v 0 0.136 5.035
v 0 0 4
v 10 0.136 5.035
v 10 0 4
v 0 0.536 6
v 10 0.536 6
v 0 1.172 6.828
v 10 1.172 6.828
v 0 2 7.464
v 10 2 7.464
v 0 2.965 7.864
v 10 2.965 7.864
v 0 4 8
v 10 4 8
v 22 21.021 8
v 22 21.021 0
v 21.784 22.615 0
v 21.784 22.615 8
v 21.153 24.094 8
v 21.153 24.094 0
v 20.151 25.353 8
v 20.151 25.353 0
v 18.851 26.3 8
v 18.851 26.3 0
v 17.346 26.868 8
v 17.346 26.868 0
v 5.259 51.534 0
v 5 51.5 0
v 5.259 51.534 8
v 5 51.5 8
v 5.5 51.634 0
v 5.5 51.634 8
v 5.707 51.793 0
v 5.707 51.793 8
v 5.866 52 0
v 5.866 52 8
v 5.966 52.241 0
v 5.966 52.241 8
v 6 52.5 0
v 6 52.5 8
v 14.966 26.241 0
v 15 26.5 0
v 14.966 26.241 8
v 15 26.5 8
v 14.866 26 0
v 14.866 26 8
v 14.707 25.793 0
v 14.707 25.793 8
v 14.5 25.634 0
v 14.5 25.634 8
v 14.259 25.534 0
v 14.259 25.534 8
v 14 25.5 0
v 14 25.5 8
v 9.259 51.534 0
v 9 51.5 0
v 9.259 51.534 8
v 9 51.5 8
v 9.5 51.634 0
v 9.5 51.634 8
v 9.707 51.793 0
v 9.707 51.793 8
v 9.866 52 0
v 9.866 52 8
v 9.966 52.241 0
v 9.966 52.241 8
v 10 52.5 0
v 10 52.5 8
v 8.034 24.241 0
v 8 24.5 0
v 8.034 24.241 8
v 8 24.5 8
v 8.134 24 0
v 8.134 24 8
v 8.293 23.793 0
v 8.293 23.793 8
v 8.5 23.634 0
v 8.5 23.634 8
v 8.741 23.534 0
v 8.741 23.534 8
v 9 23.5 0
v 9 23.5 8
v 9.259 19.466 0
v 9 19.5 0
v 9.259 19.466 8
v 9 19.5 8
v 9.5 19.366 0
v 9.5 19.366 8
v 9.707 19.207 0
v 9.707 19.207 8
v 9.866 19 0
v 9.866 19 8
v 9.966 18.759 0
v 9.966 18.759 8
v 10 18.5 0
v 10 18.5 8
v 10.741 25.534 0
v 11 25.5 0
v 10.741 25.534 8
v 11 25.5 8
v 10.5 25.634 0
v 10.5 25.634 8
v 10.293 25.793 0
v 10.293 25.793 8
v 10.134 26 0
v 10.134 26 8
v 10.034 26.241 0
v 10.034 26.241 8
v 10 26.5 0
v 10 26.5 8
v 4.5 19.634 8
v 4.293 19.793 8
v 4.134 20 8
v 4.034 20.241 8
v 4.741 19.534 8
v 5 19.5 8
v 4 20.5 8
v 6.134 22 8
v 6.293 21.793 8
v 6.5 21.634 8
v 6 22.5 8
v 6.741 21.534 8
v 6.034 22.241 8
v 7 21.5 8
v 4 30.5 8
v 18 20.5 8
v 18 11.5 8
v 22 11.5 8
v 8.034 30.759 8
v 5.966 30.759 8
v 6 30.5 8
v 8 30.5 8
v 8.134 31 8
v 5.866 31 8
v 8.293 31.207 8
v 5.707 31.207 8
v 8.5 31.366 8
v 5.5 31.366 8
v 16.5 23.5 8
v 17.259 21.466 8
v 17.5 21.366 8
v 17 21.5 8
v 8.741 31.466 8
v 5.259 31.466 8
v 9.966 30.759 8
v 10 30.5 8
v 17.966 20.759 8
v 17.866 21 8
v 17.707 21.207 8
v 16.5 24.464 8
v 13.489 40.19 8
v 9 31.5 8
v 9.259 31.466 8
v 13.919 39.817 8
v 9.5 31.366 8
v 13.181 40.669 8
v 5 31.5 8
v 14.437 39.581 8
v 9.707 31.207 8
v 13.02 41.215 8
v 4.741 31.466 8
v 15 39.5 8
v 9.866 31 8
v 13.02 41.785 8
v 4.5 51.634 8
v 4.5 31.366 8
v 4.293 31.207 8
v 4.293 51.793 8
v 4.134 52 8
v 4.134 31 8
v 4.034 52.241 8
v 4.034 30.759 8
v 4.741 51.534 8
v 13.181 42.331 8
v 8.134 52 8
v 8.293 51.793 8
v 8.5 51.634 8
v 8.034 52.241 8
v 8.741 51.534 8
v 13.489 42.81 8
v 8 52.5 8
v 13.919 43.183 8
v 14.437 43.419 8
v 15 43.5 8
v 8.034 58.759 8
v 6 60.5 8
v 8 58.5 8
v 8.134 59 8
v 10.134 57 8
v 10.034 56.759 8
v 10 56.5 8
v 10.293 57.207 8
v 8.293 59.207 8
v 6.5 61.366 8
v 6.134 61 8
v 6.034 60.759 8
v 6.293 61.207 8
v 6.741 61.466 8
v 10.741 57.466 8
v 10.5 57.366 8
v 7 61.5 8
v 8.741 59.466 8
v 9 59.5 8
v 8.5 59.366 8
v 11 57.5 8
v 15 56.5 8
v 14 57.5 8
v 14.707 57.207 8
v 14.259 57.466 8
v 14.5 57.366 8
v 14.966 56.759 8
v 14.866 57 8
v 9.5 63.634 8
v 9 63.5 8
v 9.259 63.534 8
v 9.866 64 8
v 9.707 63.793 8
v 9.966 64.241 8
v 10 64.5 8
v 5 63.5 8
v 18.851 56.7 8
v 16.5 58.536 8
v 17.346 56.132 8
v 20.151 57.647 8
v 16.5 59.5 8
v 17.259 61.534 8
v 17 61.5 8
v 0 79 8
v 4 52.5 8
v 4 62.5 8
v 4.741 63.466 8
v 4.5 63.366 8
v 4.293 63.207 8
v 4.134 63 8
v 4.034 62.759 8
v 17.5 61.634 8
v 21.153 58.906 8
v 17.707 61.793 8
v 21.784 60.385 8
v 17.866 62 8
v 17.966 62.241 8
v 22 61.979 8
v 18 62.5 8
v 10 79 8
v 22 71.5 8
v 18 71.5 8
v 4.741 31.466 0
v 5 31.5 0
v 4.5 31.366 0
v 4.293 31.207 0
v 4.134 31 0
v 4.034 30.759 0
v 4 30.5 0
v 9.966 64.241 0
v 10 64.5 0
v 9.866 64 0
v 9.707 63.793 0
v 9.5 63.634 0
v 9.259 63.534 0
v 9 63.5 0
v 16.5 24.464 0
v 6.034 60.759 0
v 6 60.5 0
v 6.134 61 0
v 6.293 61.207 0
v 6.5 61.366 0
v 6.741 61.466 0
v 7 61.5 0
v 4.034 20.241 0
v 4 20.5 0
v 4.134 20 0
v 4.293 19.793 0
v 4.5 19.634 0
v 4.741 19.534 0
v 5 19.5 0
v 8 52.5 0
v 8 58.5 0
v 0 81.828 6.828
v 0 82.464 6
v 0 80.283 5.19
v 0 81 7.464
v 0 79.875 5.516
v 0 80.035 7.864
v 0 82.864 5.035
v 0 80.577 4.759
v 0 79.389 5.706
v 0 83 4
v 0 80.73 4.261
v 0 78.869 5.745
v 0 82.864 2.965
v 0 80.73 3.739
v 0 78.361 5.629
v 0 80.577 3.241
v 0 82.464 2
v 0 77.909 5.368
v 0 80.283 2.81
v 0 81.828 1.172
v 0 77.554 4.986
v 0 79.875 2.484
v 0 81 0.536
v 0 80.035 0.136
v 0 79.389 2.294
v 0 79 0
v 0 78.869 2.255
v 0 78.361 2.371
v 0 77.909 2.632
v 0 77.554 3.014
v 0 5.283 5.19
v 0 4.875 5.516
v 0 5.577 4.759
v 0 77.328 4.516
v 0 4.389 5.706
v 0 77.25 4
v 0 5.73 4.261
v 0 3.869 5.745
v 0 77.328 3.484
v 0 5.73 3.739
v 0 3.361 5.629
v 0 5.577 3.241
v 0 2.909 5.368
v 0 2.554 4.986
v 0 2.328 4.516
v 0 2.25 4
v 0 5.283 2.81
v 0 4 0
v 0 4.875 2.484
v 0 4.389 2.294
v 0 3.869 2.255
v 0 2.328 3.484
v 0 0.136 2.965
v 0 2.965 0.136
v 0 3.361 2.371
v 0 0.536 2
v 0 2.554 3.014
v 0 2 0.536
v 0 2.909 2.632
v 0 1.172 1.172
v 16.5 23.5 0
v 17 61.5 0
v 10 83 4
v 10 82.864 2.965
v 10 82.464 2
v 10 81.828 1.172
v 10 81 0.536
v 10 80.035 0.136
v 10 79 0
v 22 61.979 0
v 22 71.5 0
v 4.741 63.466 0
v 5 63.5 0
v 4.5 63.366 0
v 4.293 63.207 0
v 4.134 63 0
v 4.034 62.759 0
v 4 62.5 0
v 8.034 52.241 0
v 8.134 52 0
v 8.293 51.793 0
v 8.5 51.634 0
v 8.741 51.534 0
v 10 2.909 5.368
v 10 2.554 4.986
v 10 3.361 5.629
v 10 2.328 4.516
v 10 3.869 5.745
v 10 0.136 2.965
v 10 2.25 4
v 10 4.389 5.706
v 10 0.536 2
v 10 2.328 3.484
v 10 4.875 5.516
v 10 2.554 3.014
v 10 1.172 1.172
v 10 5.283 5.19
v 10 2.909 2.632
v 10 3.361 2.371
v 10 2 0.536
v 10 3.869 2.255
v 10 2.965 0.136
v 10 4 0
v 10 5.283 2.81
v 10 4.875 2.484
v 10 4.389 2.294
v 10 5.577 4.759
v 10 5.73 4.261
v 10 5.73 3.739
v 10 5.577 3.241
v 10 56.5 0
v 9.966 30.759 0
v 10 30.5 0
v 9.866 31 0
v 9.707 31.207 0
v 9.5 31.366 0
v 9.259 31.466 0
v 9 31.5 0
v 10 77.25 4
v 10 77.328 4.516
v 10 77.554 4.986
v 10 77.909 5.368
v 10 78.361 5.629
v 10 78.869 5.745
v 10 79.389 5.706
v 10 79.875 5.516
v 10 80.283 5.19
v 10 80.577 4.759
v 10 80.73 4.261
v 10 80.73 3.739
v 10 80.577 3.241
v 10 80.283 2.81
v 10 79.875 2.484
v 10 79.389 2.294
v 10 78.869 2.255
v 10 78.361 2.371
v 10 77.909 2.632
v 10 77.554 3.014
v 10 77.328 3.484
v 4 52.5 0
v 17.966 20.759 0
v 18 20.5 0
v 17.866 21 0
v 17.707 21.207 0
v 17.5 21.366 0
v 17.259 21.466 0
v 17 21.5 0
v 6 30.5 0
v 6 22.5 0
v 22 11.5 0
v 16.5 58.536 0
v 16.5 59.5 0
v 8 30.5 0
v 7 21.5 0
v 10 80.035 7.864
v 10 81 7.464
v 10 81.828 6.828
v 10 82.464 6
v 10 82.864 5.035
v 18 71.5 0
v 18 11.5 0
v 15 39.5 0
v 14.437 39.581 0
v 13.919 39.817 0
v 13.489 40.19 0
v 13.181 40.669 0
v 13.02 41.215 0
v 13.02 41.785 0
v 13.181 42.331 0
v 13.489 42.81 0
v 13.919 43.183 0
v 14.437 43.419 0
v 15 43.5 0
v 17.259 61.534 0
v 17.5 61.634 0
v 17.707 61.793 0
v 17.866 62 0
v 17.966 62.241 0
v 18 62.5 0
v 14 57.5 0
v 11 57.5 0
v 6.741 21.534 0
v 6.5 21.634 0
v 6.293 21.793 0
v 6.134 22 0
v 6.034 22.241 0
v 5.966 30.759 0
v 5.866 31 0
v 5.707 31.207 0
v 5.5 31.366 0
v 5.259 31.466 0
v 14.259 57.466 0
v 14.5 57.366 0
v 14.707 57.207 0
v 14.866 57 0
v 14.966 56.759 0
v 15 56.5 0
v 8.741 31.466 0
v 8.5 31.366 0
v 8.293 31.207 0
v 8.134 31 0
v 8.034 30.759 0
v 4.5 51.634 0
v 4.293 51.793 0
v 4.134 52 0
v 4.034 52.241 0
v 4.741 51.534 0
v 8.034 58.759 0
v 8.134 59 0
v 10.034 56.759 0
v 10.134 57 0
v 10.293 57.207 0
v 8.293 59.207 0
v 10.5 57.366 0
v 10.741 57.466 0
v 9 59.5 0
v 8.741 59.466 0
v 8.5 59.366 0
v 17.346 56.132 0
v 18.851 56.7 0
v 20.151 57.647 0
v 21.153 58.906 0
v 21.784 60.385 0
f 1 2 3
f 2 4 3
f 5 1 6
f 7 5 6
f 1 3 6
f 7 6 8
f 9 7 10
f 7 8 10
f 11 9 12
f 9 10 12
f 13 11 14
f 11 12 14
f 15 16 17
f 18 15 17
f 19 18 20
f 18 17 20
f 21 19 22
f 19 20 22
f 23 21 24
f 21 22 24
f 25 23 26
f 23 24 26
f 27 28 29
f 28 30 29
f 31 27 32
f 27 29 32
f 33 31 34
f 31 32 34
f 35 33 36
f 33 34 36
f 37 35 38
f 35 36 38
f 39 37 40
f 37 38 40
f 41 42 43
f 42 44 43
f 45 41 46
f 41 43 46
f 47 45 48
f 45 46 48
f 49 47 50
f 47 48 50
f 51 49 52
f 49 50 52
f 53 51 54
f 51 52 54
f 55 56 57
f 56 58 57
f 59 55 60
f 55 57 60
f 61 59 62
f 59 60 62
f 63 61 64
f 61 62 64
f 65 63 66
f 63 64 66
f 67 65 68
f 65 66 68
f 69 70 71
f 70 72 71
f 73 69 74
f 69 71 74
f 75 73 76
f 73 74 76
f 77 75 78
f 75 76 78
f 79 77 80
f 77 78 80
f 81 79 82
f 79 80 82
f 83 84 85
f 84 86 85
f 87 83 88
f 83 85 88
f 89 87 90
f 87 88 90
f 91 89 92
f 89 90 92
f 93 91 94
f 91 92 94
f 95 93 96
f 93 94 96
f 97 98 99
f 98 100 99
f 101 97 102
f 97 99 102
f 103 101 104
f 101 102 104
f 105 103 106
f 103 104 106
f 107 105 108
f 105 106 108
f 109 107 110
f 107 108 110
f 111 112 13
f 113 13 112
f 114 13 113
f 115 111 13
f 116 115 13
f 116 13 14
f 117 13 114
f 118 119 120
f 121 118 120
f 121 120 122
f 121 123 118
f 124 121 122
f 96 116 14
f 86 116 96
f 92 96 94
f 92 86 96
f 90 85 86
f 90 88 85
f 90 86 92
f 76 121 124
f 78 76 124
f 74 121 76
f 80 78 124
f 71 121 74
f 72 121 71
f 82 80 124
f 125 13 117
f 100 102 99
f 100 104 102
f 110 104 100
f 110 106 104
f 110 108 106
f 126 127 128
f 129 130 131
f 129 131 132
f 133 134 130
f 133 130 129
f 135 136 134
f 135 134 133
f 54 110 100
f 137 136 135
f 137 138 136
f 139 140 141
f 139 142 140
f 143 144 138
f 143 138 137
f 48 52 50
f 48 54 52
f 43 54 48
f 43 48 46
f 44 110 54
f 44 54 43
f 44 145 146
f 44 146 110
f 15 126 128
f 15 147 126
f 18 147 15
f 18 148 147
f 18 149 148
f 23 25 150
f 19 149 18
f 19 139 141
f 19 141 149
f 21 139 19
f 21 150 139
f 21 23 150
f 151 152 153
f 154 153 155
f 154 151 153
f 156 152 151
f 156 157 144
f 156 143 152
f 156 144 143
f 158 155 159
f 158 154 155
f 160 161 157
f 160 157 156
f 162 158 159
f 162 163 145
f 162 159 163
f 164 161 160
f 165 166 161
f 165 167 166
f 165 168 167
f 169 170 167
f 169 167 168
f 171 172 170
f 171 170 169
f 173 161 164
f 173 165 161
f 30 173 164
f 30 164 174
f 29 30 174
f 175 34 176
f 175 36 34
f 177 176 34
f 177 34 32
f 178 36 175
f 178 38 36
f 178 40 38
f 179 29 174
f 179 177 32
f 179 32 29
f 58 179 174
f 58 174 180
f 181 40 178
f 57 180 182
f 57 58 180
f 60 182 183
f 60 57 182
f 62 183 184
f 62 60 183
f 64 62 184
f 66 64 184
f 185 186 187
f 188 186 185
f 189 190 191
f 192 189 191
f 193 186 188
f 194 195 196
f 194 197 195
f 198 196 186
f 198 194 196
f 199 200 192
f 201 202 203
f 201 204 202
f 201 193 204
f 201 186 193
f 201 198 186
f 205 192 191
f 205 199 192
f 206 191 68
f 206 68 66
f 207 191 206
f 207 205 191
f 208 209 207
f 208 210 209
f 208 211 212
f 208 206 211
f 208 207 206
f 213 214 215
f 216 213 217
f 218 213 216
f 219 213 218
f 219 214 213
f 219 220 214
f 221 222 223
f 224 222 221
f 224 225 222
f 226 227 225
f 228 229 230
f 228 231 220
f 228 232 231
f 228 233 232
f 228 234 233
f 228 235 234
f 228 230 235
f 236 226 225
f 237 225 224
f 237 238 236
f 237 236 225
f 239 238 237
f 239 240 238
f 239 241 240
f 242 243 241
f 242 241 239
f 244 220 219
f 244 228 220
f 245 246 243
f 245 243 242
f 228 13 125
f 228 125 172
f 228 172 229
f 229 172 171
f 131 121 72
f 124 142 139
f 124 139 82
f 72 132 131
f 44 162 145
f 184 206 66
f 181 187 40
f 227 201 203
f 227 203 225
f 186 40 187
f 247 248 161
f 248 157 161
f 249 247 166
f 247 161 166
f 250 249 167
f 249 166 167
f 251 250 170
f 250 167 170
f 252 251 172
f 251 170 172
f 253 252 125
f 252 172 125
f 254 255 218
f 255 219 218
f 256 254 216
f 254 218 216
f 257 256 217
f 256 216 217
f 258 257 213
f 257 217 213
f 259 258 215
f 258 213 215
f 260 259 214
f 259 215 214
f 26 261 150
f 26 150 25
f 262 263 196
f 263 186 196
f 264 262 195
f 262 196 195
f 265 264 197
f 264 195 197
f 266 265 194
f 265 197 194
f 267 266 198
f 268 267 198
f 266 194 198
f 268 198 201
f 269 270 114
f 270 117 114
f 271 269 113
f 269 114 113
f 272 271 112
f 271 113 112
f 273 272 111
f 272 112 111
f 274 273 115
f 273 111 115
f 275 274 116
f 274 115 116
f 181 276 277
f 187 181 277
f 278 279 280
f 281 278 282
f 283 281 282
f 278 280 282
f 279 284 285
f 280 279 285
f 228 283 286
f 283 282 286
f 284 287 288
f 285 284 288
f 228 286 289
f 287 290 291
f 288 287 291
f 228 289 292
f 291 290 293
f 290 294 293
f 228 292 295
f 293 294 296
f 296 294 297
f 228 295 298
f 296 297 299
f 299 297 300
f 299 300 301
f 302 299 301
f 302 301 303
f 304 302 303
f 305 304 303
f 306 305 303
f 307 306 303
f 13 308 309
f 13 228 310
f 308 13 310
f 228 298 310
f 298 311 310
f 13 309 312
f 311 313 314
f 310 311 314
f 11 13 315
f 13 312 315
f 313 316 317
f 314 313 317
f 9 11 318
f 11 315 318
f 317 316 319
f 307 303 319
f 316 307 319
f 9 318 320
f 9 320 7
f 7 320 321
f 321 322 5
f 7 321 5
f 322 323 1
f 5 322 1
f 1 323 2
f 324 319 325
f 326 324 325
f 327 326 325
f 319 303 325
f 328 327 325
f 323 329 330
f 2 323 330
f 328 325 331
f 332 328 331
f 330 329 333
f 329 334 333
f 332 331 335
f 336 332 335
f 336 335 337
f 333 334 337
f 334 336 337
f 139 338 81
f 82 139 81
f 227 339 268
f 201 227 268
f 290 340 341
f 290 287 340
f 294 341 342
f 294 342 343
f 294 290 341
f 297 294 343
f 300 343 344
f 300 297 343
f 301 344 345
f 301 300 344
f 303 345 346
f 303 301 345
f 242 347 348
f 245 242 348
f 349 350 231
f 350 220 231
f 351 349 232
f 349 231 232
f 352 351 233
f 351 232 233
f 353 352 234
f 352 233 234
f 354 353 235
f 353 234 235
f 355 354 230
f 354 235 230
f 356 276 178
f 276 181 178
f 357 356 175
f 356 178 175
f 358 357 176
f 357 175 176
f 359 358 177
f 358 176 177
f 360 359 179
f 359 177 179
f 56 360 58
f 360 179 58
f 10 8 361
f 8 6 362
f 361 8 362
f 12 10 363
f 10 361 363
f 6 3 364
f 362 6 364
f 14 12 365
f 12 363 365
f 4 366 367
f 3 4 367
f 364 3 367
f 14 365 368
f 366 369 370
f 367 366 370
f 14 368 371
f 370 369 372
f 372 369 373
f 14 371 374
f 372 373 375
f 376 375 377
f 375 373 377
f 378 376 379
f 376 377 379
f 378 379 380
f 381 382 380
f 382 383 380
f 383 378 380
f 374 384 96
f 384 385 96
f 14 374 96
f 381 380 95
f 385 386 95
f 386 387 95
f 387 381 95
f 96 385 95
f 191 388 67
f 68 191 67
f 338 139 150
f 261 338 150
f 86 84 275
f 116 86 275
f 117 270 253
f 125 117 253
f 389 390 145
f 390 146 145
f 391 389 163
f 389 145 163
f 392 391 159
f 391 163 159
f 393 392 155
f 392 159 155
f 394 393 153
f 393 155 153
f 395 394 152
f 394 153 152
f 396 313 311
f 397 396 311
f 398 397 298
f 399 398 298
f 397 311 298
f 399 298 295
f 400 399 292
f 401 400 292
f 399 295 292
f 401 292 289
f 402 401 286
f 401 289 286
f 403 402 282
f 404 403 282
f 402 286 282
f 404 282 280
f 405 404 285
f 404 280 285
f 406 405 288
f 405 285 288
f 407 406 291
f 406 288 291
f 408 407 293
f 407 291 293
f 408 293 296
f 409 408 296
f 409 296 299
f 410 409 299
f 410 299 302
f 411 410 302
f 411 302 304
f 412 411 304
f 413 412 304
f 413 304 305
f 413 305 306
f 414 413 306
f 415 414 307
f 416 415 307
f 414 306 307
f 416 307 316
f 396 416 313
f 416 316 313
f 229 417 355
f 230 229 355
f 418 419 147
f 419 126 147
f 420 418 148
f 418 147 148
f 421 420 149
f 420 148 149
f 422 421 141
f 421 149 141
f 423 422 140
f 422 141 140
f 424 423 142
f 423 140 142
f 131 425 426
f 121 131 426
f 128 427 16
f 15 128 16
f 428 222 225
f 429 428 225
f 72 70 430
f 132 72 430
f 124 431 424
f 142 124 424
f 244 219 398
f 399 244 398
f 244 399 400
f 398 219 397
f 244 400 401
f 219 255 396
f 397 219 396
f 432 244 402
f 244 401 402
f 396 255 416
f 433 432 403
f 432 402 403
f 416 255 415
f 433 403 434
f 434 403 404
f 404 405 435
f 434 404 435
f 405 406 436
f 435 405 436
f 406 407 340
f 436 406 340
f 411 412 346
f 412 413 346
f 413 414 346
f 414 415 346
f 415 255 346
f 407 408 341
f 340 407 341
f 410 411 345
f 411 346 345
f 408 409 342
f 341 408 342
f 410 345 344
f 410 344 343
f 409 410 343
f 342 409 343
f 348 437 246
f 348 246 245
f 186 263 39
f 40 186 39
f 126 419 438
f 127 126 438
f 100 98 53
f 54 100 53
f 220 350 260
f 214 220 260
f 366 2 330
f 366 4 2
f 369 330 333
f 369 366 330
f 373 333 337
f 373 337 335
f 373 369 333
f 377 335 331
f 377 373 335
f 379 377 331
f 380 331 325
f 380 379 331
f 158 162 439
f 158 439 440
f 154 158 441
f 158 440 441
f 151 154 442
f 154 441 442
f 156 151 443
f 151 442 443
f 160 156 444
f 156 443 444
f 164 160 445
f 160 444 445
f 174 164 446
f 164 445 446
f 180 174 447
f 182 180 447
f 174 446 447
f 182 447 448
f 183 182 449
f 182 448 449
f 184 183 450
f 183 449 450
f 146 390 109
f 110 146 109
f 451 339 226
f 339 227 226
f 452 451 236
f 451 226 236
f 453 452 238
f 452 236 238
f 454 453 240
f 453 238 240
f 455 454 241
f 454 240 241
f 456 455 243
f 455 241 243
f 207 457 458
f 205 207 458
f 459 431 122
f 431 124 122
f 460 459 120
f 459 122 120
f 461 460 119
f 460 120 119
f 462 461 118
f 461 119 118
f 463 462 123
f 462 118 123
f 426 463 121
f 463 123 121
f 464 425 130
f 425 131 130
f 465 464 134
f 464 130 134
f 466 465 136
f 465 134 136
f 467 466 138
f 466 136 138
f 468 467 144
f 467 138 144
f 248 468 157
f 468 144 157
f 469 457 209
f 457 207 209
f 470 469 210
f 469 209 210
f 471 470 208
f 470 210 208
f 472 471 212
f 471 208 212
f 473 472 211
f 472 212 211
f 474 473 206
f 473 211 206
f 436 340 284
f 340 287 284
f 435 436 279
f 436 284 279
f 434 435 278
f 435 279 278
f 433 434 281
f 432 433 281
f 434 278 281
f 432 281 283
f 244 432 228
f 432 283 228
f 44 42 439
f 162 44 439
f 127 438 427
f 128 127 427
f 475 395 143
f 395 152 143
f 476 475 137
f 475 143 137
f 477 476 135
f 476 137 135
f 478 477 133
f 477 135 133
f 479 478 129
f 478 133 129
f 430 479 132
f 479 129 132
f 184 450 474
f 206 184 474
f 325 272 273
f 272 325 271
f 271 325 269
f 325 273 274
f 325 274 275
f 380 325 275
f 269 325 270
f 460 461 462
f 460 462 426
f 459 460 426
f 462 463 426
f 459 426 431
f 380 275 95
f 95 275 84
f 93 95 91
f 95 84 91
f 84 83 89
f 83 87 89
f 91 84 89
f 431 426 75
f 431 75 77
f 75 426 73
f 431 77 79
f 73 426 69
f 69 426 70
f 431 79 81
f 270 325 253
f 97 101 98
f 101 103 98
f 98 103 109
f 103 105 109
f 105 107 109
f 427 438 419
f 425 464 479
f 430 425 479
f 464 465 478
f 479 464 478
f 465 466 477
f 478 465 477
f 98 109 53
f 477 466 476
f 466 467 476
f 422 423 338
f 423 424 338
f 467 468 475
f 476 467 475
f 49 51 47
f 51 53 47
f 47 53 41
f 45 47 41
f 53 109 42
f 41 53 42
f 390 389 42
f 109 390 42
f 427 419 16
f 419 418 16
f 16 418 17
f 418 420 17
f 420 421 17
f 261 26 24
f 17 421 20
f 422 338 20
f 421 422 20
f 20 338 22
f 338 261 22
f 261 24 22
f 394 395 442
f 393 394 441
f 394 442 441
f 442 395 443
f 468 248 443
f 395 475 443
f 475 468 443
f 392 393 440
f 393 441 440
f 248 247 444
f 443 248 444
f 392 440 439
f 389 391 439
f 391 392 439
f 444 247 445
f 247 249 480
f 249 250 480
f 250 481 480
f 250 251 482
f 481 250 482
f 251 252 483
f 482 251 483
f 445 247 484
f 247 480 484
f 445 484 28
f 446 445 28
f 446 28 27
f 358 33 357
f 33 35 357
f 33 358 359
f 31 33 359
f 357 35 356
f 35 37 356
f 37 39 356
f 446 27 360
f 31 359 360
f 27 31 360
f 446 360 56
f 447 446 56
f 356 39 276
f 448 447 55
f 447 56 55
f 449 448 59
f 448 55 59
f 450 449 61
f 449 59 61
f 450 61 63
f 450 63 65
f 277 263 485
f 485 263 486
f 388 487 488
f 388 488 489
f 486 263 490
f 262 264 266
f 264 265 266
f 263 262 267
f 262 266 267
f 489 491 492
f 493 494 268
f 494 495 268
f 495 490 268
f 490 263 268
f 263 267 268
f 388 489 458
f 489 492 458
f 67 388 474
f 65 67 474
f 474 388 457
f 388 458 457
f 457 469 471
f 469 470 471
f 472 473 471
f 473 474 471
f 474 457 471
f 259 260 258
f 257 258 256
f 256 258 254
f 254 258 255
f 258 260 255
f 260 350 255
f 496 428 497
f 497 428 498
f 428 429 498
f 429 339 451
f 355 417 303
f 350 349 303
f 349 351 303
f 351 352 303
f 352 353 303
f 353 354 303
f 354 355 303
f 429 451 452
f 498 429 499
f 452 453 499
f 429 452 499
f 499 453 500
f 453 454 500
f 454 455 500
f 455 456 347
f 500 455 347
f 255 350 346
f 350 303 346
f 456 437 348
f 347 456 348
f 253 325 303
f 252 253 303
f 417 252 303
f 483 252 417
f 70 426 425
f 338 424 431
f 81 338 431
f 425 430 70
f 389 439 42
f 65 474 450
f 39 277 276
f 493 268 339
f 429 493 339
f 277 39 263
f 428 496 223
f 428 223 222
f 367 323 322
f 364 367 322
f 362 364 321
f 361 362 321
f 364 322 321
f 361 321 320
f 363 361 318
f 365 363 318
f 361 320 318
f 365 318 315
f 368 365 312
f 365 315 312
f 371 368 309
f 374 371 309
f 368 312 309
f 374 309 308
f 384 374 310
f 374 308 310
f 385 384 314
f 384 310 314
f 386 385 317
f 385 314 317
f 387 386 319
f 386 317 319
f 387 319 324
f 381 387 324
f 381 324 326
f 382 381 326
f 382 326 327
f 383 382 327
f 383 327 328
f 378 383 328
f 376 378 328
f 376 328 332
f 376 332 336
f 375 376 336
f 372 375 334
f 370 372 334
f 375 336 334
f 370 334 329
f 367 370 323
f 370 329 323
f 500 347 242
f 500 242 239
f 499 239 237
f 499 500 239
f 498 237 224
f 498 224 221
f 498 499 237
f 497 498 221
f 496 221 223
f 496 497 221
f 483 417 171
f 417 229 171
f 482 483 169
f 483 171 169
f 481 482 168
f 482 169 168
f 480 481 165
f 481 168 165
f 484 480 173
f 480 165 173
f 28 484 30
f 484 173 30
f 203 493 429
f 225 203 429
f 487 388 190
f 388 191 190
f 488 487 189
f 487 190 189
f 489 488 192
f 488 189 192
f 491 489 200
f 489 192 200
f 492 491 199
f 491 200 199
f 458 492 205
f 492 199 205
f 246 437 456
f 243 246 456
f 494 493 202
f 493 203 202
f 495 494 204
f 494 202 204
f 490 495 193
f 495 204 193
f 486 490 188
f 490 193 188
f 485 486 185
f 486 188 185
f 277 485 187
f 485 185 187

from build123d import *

# Parameters (mm, degrees)
F0_W        = 4
F0_H        = 8
F0_H_2      = 2
F0_W_2      = 5.5
F0_H_3      = 3.5
F1_DEPTH    = 8
F2_R        = 3.99999
F3_T1_DEPTH = 37.8956518578
F4_T1_DEPTH = 21.1532650868
F5_T1_DEPTH = 21.1532650868
F7_DEPTH    = 8
F8_R        = 0.99999
F9_R        = 1.75
F10_DEPTH   = 10


# Not quite as in the source:
# - a fillet or chamfer that OpenCascade refuses, or shapes differently, is made with other operations: its cross-section is extruded or revolved along the edge and cut away or added
# - a fillet or chamfer is up to 0.001 mm smaller than in the source, because OpenCascade refuses the exact size


with BuildPart() as f1:
    # F0 (on Top) → F1 (new body)
    with BuildSketch(Plane.XY):
        Polygon((0, 83), (0, 0), (10, 0), (10, 10), (10, 19.5), (8, 19.5), (4, 19.5), (4, 31.5), (6, 31.5), (8, 31.5), (10, 31.5), (10, 25.5), (15, 25.5), (15, 57.5), (10, 57.5), (10, 51.5), (8, 51.5), (6, 51.5), (4, 51.5), (4, 63.5), (8, 63.5), (10, 63.5), (10, 73), (10, 83), align=None)
        with Locations((20, 67.5)):
            Rectangle(F0_W, F0_H)
        with Locations((20, 62.5)):
            Rectangle(F0_W, F0_H_2)
        with Locations((19.25, 57.75)):
            Rectangle(F0_W_2, F0_H_3)
        with Locations((19.25, 25.25)):
            Rectangle(F0_W_2, F0_H_3)
        with Locations((20, 20.5)):
            Rectangle(F0_W, F0_H_2)
        with Locations((20, 15.5)):
            Rectangle(F0_W, F0_H)
        Polygon((8, 23.5), (8, 21.5), (18, 21.5), (22, 21.5), (22, 23.5), (16.5, 23.5), (15, 23.5), align=None)
        Polygon((6, 21.5), (8, 21.5), (8, 23.5), (8, 25.5), (8, 31.5), (6, 31.5), align=None)
        Polygon((8, 59.5), (8, 61.5), (6, 61.5), (6, 51.5), (8, 51.5), (8, 57.5), align=None)
        Polygon((18, 61.5), (8, 61.5), (8, 59.5), (15, 59.5), (16.5, 59.5), (22, 59.5), (22, 61.5), align=None)
    extrude(amount=F1_DEPTH)

    # F2 (radius 4 in the source; OpenCascade refuses exactly that, so slightly less here)
    f2_edges = [f1.edges().sort_by_distance(p)[0] for p in [
        (5, 83, 8),
        (5, 0, 8),
        (5, 0, 0),
        (5, 83, 0),
    ]]
    fillet(f2_edges, radius=F2_R)

    # F3: fillet of radius 6 on 2 edges, made by hand

    # F3_s2 → F3_t1 (cut)
    with BuildSketch(Plane.XY.offset(-14.9478259289)):
        with BuildLine():
            ThreePointArc((22, 61.9791303716), (20.4158804332, 57.9171111692), (16.5, 56))
            Line((16.5, 56), (22, 56))
            Line((22, 56), (22, 61.9791303716))
        make_face()
        with BuildLine():
            ThreePointArc((22, 21.0208696284), (20.4158804332, 25.0828888308), (16.5, 27))
            Line((16.5, 27), (22, 27))
            Line((22, 27), (22, 21.0208696284))
        make_face()
    extrude(amount=F3_T1_DEPTH, mode=Mode.SUBTRACT)

    # F4: chamfer of 0.5 x 2.5 on 1 edges, made by hand

    # F4_s2 → F4_t1 (cut)
    with BuildSketch(Plane.XY.offset(-6.5766325434)):
        with BuildLine():
            Line((17.379363756, 56.0377654524), (16.466798813, 58.6304434947))
            Line((16.466798813, 58.6304434947), (16.416798813, 58.6304434947))
            ThreePointArc((16.416798813, 58.6304434947), (16.45, 57.3152217474), (16.45, 56))
            Line((16.45, 56), (16.5041666667, 55.9501739136))
            ThreePointArc((16.5041666667, 55.9501739136), (16.9421943049, 56.0029468158), (17.3905817774, 55.9890401407))
            Line((17.3905817774, 55.9890401407), (17.379363756, 56.0377654524))
        make_face()
    extrude(amount=F4_T1_DEPTH, mode=Mode.SUBTRACT)

    # F5: chamfer of 0.5 x 2.5 on 1 edges, made by hand

    # F5_s2 → F5_t1 (cut)
    with BuildSketch(Plane.XY.offset(-6.5766325434)):
        with BuildLine():
            Line((16.466798813, 24.3695565053), (17.379363756, 26.9622345476))
            Line((17.379363756, 26.9622345476), (17.3905817774, 27.0109598593))
            ThreePointArc((17.3905817774, 27.0109598593), (16.9421943049, 26.9970531842), (16.5041666667, 27.0498260864))
            Line((16.5041666667, 27.0498260864), (16.45, 27))
            ThreePointArc((16.45, 27), (16.45, 25.6847782526), (16.416798813, 24.3695565053))
            Line((16.416798813, 24.3695565053), (16.466798813, 24.3695565053))
        make_face()
    extrude(amount=F5_T1_DEPTH, mode=Mode.SUBTRACT)

    # F6 (on face) → F7 (cut)
    with BuildSketch(Plane(origin=(0, 0, 0), x_dir=(1, 0, 0), z_dir=(0, 0, -1))):
        with BuildLine():
            Line((15, -43.5), (15, -39.5))
            ThreePointArc((15, -39.5), (13, -41.5), (15, -43.5))
        make_face()
    extrude(amount=-F7_DEPTH, mode=Mode.SUBTRACT)

    # F8 (radius 1 in the source; OpenCascade refuses exactly that, so slightly less here)
    f8_edges = [f1.edges().sort_by_distance(p)[0] for p in [
        (18, 21.5, 4),
        (6, 21.5, 4),
        (4, 19.5, 4),
        (10, 19.5, 4),
        (8, 23.5, 4),
        (15, 25.5, 4),
        (10, 25.5, 4),
        (8, 31.5, 4),
        (10, 31.5, 4),
        (6, 31.5, 4),
        (4, 31.5, 4),
        (6, 51.5, 4),
        (10, 51.5, 4),
        (18, 61.5, 4),
        (6, 61.5, 4),
        (10, 57.5, 4),
        (15, 57.5, 4),
        (8, 59.5, 4),
        (4, 51.5, 4),
        (8, 51.5, 4),
        (4, 63.5, 4),
        (10, 63.5, 4),
    ]]
    fillet(f8_edges, radius=F8_R)

    # F9 (on face) → F10 (cut)
    with BuildSketch(Plane(origin=(0, 0, 0), x_dir=(0, -1, 0), z_dir=(-1, 0, 0))):
        with Locations((-79, 4)):
            Circle(F9_R)
        with Locations((-4, 4)):
            Circle(F9_R)
    extrude(amount=-F10_DEPTH, mode=Mode.SUBTRACT)


solid = f1.part
